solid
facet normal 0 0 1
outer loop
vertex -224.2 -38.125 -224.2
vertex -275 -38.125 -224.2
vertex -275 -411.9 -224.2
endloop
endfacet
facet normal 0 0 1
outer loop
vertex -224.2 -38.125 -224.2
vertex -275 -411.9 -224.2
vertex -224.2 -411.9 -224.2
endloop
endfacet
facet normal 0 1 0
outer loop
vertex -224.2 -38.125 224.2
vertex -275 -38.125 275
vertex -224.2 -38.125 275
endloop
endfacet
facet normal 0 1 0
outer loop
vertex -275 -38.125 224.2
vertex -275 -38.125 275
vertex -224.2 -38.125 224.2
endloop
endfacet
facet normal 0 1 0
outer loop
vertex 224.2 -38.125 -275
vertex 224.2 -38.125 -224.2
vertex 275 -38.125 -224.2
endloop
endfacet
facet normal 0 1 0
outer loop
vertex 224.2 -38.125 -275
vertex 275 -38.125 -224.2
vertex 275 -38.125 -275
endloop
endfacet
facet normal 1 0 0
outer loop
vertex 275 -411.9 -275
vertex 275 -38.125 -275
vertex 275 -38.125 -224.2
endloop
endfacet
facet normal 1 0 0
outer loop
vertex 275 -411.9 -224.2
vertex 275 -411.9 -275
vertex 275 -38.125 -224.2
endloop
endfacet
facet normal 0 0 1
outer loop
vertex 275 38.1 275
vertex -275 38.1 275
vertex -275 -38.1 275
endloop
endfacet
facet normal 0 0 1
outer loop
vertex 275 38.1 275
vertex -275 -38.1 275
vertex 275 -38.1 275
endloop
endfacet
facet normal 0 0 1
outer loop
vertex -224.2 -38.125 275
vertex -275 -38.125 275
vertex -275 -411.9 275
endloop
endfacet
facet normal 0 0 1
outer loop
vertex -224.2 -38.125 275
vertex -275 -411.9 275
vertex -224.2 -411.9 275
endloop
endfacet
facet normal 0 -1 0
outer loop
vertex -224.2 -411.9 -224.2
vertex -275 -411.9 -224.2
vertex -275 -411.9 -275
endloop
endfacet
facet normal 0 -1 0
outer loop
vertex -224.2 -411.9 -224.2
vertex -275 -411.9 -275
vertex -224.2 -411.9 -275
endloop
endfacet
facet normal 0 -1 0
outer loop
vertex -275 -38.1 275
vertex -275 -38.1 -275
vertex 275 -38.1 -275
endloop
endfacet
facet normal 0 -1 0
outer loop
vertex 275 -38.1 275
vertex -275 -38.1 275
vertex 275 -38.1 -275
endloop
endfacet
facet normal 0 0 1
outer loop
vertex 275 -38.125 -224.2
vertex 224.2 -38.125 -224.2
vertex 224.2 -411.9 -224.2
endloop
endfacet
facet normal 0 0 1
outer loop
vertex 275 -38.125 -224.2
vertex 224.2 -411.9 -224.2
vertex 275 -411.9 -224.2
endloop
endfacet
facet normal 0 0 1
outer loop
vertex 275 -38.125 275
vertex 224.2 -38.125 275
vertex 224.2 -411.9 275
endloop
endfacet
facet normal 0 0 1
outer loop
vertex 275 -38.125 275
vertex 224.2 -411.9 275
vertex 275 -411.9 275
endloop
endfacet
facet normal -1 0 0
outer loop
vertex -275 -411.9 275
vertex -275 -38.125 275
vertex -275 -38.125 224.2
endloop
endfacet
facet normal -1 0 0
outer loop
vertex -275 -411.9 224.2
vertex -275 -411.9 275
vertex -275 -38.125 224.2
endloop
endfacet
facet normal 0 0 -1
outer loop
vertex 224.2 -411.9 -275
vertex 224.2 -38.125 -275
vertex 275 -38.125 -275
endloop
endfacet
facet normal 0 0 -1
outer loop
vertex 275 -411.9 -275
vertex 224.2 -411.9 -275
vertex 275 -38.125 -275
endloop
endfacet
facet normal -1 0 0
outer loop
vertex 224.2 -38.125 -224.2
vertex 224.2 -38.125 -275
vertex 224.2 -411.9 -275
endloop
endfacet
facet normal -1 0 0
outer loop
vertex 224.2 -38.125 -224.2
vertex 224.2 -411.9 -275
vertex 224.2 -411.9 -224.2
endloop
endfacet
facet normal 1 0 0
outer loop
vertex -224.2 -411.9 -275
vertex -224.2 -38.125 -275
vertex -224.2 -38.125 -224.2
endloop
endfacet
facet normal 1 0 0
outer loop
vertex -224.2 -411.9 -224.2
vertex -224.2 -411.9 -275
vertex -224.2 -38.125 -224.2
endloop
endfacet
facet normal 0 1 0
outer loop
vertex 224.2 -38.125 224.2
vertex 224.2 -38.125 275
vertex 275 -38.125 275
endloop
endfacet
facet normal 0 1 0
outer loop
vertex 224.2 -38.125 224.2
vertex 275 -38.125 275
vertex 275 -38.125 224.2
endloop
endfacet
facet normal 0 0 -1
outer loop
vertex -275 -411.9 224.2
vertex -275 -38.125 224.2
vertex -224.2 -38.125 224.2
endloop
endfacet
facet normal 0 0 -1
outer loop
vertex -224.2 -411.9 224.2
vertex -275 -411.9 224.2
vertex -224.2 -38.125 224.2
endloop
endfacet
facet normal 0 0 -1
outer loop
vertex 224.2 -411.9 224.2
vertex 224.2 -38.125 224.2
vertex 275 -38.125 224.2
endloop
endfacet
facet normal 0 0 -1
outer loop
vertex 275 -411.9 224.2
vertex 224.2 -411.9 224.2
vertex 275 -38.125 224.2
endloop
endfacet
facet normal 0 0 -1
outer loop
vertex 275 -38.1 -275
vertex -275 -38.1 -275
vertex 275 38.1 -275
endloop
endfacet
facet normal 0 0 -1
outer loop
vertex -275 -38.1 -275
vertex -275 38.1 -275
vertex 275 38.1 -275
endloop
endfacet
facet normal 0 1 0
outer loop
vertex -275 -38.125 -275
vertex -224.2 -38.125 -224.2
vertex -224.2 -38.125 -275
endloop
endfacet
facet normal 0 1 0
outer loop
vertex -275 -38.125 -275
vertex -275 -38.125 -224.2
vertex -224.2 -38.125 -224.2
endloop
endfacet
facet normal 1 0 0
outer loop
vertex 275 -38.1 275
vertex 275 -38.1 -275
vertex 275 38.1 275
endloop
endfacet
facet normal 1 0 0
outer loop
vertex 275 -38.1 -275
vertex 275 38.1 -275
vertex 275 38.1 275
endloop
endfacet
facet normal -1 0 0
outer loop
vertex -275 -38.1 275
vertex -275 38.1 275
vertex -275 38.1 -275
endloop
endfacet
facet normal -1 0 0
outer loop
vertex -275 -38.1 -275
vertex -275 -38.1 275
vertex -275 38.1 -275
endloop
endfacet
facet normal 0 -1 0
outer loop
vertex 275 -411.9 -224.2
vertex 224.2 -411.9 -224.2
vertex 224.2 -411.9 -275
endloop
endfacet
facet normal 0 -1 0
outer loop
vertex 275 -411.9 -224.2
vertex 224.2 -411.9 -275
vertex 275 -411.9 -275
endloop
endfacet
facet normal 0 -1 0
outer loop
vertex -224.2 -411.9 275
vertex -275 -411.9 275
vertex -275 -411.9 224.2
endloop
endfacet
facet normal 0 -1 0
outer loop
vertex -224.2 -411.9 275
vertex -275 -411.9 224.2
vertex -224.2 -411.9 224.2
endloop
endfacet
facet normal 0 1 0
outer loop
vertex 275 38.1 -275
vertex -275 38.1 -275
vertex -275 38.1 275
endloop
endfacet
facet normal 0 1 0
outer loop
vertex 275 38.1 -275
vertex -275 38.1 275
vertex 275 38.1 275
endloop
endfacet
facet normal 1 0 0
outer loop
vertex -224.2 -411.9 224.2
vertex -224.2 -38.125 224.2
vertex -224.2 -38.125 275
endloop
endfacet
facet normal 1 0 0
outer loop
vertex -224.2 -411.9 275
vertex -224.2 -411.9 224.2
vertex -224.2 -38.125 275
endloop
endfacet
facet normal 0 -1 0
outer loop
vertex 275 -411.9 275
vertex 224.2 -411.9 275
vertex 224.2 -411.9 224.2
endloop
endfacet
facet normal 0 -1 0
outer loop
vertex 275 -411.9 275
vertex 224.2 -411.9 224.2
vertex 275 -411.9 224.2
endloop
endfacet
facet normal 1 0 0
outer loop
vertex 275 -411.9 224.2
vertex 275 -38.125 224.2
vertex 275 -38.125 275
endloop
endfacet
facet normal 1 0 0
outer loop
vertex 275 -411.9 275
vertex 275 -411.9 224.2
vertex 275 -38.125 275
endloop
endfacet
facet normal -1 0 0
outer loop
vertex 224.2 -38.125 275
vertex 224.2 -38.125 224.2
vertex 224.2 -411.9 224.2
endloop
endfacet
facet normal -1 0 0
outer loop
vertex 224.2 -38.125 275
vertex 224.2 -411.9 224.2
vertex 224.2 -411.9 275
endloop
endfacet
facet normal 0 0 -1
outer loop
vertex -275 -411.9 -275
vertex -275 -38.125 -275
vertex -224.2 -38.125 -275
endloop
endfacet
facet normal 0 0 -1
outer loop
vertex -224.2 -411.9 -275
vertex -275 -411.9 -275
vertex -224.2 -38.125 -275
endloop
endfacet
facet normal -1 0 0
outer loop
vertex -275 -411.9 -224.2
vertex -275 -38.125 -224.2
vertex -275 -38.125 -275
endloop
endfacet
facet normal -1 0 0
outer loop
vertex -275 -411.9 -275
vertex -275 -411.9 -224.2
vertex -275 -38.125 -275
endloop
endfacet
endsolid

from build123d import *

# Parameters (mm, degrees)
SKETCH3_W               = 550
SKETCH3_H               = 550
BOSS_EXTRUDE2_DEPTH     = 38.1
SKETCH5_W               = 50.8
SKETCH5_H               = 50.8
BOSS_EXTRUDE3_DEPTH     = 373.8
CUT_EXTRUDE1_DEPTH      = 741.126077098
CUT_EXTRUDE1_DEPTH_BACK = 741.126077098
SKETCH6_W               = 655.630835137
SKETCH6_H               = 0.0254


with BuildPart() as part:
    # Sketch3 → Boss-Extrude2 (new, symmetric)
    with BuildSketch(Plane(origin=(0, 0, 0), x_dir=(1, 0, 0), z_dir=(0, 1, 0))):
        Rectangle(SKETCH3_W, SKETCH3_H)
    extrude(amount=BOSS_EXTRUDE2_DEPTH, both=True)

    # Sketch5 → Boss-Extrude3 (add)
    with BuildSketch(Plane.XZ.offset(38.1)):
        with Locations((249.6, 249.6)):
            Rectangle(SKETCH5_W, SKETCH5_H)
        with Locations((249.6, -249.6)):
            Rectangle(SKETCH5_W, SKETCH5_H)
        with Locations((-249.6, -249.6)):
            Rectangle(SKETCH5_W, SKETCH5_H)
        with Locations((-249.6, 249.6)):
            Rectangle(SKETCH5_W, SKETCH5_H)
    extrude(amount=BOSS_EXTRUDE3_DEPTH)

    # Sketch6 → Cut-Extrude1 (cut, two sides: drawn at the far end of the back side and taken through both)
    with BuildSketch(Plane(origin=(275, 0, 0), x_dir=(0, 0, -1), z_dir=(1, 0, 0)).offset(-CUT_EXTRUDE1_DEPTH_BACK)):
        with Locations((32.666920981, -38.1127)):
            Rectangle(SKETCH6_W, SKETCH6_H)
    extrude(amount=CUT_EXTRUDE1_DEPTH + CUT_EXTRUDE1_DEPTH_BACK, mode=Mode.SUBTRACT)


with BuildPart() as cut_extrude1_piece_1:
    # of the separate pieces the step leaves, piece 1, a body of its own (cut_extrude1_pieces)
    add(part.part.solids().sort_by_distance((-275, -38.1, -275))[0])


with BuildPart() as cut_extrude1_piece_2:
    # of the separate pieces the step leaves, piece 2, a body of its own (cut_extrude1_pieces)
    add(part.part.solids().sort_by_distance((275, -38.1254, 224.2))[0])


with BuildPart() as cut_extrude1_piece_3:
    # of the separate pieces the step leaves, piece 3, a body of its own (cut_extrude1_pieces)
    add(part.part.solids().sort_by_distance((-275, -411.9, 275))[0])


with BuildPart() as cut_extrude1_piece_4:
    # of the separate pieces the step leaves, piece 4, a body of its own (cut_extrude1_pieces)
    add(part.part.solids().sort_by_distance((-275, -411.9, -275))[0])


with BuildPart() as cut_extrude1_piece_5:
    # of the separate pieces the step leaves, piece 5, a body of its own (cut_extrude1_pieces)
    add(part.part.solids().sort_by_distance((224.2, -38.1254, -275))[0])


solid = Compound([cut_extrude1_piece_1.part, cut_extrude1_piece_2.part, cut_extrude1_piece_3.part, cut_extrude1_piece_4.part, cut_extrude1_piece_5.part])
